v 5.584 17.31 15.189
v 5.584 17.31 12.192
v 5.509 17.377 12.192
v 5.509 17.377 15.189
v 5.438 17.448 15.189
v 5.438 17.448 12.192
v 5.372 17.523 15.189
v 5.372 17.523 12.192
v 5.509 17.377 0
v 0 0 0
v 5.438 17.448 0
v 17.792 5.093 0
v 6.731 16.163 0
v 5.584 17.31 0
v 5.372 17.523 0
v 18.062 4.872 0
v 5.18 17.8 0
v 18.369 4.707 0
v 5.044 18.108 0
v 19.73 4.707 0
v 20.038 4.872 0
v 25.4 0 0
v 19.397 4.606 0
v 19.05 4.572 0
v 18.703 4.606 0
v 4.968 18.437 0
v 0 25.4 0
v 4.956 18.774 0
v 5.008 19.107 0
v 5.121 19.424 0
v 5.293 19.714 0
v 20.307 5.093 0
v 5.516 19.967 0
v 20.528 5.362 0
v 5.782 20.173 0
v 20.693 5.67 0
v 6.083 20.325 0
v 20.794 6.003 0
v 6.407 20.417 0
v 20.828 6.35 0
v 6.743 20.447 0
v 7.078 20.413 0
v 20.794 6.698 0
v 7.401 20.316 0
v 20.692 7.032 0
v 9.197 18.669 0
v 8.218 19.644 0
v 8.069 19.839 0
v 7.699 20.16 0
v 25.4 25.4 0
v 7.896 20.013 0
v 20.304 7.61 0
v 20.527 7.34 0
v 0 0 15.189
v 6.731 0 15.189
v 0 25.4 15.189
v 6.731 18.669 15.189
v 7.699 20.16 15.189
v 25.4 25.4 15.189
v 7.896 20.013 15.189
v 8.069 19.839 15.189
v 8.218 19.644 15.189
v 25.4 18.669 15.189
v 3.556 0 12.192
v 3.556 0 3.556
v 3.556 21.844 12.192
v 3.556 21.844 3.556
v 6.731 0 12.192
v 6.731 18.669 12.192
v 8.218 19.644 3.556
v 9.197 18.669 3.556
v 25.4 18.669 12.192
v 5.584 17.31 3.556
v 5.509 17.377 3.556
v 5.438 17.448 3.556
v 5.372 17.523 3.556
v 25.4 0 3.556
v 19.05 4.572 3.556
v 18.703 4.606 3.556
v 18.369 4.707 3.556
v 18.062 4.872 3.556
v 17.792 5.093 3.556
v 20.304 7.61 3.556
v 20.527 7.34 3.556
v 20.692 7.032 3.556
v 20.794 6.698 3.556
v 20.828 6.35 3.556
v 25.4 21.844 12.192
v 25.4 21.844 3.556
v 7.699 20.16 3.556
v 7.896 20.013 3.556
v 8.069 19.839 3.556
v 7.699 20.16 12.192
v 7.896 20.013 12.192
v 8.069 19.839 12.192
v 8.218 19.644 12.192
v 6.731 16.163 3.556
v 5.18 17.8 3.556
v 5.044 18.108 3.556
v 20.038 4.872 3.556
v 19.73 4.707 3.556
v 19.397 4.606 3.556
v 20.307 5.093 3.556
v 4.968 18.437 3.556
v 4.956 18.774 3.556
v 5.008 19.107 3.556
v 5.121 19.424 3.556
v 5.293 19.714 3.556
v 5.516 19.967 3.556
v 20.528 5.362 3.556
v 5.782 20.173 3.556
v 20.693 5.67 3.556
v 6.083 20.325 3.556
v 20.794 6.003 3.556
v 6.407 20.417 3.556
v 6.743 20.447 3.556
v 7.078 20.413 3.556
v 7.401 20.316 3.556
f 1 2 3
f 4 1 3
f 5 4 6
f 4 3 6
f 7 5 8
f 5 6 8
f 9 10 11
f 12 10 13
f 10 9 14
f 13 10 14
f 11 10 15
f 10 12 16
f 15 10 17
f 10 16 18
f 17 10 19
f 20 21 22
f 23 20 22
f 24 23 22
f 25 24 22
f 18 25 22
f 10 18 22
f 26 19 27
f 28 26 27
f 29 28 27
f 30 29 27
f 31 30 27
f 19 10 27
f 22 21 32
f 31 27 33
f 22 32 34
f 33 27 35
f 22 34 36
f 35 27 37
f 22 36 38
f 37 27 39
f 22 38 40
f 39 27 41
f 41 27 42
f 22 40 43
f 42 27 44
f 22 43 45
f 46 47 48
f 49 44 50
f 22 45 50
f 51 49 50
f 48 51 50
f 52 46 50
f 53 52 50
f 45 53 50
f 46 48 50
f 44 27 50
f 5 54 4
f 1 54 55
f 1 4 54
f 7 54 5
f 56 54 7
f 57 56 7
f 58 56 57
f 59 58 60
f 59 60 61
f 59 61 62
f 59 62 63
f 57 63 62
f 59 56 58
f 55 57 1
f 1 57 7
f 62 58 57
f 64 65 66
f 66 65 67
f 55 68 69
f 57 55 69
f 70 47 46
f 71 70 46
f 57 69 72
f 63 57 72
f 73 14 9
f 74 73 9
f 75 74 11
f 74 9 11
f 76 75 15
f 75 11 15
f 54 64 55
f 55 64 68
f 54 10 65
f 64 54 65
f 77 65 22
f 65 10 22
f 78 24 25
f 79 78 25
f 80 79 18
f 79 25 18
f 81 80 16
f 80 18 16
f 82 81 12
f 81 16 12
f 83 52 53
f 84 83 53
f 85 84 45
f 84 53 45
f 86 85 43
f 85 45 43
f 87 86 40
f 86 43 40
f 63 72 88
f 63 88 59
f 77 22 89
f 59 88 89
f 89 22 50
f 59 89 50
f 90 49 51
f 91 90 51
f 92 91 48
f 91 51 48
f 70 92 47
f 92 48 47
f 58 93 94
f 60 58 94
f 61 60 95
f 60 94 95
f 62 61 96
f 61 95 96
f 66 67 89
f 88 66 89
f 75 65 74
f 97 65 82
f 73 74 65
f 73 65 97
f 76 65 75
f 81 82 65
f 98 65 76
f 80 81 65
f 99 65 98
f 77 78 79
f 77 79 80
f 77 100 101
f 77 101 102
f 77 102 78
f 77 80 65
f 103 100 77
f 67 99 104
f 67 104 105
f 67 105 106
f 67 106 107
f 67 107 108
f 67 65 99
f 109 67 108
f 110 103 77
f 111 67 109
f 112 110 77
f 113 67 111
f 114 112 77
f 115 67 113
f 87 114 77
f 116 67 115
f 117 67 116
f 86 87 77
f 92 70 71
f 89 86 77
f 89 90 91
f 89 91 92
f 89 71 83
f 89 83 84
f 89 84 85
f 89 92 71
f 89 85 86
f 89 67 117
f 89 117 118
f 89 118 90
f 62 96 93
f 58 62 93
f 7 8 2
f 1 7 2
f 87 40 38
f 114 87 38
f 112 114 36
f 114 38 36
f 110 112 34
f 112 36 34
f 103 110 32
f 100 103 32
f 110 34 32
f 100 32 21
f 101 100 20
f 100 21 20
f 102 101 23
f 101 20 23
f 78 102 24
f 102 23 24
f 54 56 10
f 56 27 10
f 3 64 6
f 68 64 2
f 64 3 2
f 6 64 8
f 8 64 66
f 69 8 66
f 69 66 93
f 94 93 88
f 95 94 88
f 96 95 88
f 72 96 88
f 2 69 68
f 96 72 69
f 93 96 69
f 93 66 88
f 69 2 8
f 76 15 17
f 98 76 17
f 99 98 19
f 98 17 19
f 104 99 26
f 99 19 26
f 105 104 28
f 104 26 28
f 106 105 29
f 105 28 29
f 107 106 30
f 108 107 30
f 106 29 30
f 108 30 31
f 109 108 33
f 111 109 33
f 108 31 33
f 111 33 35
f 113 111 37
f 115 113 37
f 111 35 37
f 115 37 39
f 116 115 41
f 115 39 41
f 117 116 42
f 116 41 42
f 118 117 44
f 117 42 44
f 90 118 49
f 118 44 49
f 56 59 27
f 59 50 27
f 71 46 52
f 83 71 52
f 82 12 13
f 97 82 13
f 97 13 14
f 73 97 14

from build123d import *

# Parameters (mm, degrees)
F1_DEPTH = 3.556
F2_DEPTH = 12.192
F3_START = 12.192
F3_DEPTH = 2.9972


with BuildPart() as f1:
    # F0 (on Top) → F1 (new body)
    with BuildSketch(Plane.XY):
        Polygon((0, 25.4), (0, 0), (3.556, 0), (3.556, 21.844), (25.4, 21.844), (25.4, 25.4), align=None)
        with BuildLine():
            Line((3.556, 21.844), (3.556, 0))
            Line((3.556, 0), (6.731, 0))
            Line((6.731, 0), (6.731, 16.162614712))
            Line((6.731, 16.162614712), (5.5840602845, 17.3103928864))
            ThreePointArc((5.5840602845, 17.3103928864), (5.47330485, 17.412223604), (5.3715550967, 17.5230534241))
            ThreePointArc((5.3715550967, 17.5230534241), (5.3980463342, 19.8456556526), (7.6994134833, 20.1601268643))
            ThreePointArc((7.6994134833, 20.1601268643), (7.9854877449, 19.9289779751), (8.2178836864, 19.6439158442))
            Line((8.2178836864, 19.6439158442), (9.1970662222, 18.669))
            Line((9.1970662222, 18.669), (25.4, 18.669))
            Line((25.4, 18.669), (25.4, 21.844))
            Line((25.4, 21.844), (3.556, 21.844))
        make_face()
        with BuildLine():
            Line((6.731, 16.162614712), (6.731, 0))
            Line((6.731, 0), (19.05, 0))
            Line((19.05, 0), (19.05, 4.572))
            ThreePointArc((19.05, 4.572), (18.3692887661, 4.7074665251), (17.79230485, 5.093223604))
            Line((17.79230485, 5.093223604), (6.731, 16.162614712))
        make_face()
        with BuildLine():
            Line((19.05, 4.572), (19.05, 0))
            Line((19.05, 0), (25.4, 0))
            Line((25.4, 0), (25.4, 18.669))
            Line((25.4, 18.669), (9.1970662222, 18.669))
            Line((9.1970662222, 18.669), (20.3044877449, 7.6099779751))
            ThreePointArc((20.3044877449, 7.6099779751), (20.6919140067, 7.0322040712), (20.828, 6.35))
            ThreePointArc((20.828, 6.35), (20.3072358569, 5.0927641431), (19.05, 4.572))
        make_face()
    extrude(amount=F1_DEPTH)

    # F0 (on Top) → F2 (join)
    with BuildSketch(Plane.XY):
        Polygon((0, 25.4), (0, 0), (3.556, 0), (3.556, 21.844), (25.4, 21.844), (25.4, 25.4), align=None)
    extrude(amount=F2_DEPTH)

    # F0 (on Top) → F3 (join)
    with BuildSketch(Plane.XY.offset(F3_START)):
        with BuildLine():
            Line((3.556, 21.844), (3.556, 0))
            Line((3.556, 0), (6.731, 0))
            Line((6.731, 0), (6.731, 16.162614712))
            Line((6.731, 16.162614712), (5.5840602845, 17.3103928864))
            ThreePointArc((5.5840602845, 17.3103928864), (5.47330485, 17.412223604), (5.3715550967, 17.5230534241))
            ThreePointArc((5.3715550967, 17.5230534241), (5.3980463342, 19.8456556526), (7.6994134833, 20.1601268643))
            ThreePointArc((7.6994134833, 20.1601268643), (7.9854877449, 19.9289779751), (8.2178836864, 19.6439158442))
            Line((8.2178836864, 19.6439158442), (9.1970662222, 18.669))
            Line((9.1970662222, 18.669), (25.4, 18.669))
            Line((25.4, 18.669), (25.4, 21.844))
            Line((25.4, 21.844), (3.556, 21.844))
        make_face()
        with BuildLine():
            ThreePointArc((5.5840602845, 17.3103928864), (6.1203935178, 16.9991366152), (6.731, 16.891))
            Line((6.731, 16.891), (6.731, 18.669))
            Line((6.731, 18.669), (8.509, 18.669))
            ThreePointArc((8.509, 18.669), (8.4346671028, 19.1777262553), (8.2178836864, 19.6439158442))
            Line((8.2178836864, 19.6439158442), (7.6994134833, 20.1601268643))
            ThreePointArc((7.6994134833, 20.1601268643), (5.3980463342, 19.8456556526), (5.3715550967, 17.5230534241))
            Line((5.3715550967, 17.5230534241), (5.5840602845, 17.3103928864))
        make_face()
        with BuildLine():
            Line((5.5840602845, 17.3103928864), (6.731, 16.162614712))
            Line((6.731, 16.162614712), (6.731, 16.891))
            ThreePointArc((6.731, 16.891), (6.1203935178, 16.9991366152), (5.5840602845, 17.3103928864))
        make_face()
        with BuildLine():
            ThreePointArc((8.2178836864, 19.6439158442), (8.4346671028, 19.1777262553), (8.509, 18.669))
            Line((8.509, 18.669), (9.1970662222, 18.669))
            Line((9.1970662222, 18.669), (8.2178836864, 19.6439158442))
        make_face()
        Polygon((0, 25.4), (0, 0), (3.556, 0), (3.556, 21.844), (25.4, 21.844), (25.4, 25.4), align=None)
    extrude(amount=F3_DEPTH)


solid = f1.part
